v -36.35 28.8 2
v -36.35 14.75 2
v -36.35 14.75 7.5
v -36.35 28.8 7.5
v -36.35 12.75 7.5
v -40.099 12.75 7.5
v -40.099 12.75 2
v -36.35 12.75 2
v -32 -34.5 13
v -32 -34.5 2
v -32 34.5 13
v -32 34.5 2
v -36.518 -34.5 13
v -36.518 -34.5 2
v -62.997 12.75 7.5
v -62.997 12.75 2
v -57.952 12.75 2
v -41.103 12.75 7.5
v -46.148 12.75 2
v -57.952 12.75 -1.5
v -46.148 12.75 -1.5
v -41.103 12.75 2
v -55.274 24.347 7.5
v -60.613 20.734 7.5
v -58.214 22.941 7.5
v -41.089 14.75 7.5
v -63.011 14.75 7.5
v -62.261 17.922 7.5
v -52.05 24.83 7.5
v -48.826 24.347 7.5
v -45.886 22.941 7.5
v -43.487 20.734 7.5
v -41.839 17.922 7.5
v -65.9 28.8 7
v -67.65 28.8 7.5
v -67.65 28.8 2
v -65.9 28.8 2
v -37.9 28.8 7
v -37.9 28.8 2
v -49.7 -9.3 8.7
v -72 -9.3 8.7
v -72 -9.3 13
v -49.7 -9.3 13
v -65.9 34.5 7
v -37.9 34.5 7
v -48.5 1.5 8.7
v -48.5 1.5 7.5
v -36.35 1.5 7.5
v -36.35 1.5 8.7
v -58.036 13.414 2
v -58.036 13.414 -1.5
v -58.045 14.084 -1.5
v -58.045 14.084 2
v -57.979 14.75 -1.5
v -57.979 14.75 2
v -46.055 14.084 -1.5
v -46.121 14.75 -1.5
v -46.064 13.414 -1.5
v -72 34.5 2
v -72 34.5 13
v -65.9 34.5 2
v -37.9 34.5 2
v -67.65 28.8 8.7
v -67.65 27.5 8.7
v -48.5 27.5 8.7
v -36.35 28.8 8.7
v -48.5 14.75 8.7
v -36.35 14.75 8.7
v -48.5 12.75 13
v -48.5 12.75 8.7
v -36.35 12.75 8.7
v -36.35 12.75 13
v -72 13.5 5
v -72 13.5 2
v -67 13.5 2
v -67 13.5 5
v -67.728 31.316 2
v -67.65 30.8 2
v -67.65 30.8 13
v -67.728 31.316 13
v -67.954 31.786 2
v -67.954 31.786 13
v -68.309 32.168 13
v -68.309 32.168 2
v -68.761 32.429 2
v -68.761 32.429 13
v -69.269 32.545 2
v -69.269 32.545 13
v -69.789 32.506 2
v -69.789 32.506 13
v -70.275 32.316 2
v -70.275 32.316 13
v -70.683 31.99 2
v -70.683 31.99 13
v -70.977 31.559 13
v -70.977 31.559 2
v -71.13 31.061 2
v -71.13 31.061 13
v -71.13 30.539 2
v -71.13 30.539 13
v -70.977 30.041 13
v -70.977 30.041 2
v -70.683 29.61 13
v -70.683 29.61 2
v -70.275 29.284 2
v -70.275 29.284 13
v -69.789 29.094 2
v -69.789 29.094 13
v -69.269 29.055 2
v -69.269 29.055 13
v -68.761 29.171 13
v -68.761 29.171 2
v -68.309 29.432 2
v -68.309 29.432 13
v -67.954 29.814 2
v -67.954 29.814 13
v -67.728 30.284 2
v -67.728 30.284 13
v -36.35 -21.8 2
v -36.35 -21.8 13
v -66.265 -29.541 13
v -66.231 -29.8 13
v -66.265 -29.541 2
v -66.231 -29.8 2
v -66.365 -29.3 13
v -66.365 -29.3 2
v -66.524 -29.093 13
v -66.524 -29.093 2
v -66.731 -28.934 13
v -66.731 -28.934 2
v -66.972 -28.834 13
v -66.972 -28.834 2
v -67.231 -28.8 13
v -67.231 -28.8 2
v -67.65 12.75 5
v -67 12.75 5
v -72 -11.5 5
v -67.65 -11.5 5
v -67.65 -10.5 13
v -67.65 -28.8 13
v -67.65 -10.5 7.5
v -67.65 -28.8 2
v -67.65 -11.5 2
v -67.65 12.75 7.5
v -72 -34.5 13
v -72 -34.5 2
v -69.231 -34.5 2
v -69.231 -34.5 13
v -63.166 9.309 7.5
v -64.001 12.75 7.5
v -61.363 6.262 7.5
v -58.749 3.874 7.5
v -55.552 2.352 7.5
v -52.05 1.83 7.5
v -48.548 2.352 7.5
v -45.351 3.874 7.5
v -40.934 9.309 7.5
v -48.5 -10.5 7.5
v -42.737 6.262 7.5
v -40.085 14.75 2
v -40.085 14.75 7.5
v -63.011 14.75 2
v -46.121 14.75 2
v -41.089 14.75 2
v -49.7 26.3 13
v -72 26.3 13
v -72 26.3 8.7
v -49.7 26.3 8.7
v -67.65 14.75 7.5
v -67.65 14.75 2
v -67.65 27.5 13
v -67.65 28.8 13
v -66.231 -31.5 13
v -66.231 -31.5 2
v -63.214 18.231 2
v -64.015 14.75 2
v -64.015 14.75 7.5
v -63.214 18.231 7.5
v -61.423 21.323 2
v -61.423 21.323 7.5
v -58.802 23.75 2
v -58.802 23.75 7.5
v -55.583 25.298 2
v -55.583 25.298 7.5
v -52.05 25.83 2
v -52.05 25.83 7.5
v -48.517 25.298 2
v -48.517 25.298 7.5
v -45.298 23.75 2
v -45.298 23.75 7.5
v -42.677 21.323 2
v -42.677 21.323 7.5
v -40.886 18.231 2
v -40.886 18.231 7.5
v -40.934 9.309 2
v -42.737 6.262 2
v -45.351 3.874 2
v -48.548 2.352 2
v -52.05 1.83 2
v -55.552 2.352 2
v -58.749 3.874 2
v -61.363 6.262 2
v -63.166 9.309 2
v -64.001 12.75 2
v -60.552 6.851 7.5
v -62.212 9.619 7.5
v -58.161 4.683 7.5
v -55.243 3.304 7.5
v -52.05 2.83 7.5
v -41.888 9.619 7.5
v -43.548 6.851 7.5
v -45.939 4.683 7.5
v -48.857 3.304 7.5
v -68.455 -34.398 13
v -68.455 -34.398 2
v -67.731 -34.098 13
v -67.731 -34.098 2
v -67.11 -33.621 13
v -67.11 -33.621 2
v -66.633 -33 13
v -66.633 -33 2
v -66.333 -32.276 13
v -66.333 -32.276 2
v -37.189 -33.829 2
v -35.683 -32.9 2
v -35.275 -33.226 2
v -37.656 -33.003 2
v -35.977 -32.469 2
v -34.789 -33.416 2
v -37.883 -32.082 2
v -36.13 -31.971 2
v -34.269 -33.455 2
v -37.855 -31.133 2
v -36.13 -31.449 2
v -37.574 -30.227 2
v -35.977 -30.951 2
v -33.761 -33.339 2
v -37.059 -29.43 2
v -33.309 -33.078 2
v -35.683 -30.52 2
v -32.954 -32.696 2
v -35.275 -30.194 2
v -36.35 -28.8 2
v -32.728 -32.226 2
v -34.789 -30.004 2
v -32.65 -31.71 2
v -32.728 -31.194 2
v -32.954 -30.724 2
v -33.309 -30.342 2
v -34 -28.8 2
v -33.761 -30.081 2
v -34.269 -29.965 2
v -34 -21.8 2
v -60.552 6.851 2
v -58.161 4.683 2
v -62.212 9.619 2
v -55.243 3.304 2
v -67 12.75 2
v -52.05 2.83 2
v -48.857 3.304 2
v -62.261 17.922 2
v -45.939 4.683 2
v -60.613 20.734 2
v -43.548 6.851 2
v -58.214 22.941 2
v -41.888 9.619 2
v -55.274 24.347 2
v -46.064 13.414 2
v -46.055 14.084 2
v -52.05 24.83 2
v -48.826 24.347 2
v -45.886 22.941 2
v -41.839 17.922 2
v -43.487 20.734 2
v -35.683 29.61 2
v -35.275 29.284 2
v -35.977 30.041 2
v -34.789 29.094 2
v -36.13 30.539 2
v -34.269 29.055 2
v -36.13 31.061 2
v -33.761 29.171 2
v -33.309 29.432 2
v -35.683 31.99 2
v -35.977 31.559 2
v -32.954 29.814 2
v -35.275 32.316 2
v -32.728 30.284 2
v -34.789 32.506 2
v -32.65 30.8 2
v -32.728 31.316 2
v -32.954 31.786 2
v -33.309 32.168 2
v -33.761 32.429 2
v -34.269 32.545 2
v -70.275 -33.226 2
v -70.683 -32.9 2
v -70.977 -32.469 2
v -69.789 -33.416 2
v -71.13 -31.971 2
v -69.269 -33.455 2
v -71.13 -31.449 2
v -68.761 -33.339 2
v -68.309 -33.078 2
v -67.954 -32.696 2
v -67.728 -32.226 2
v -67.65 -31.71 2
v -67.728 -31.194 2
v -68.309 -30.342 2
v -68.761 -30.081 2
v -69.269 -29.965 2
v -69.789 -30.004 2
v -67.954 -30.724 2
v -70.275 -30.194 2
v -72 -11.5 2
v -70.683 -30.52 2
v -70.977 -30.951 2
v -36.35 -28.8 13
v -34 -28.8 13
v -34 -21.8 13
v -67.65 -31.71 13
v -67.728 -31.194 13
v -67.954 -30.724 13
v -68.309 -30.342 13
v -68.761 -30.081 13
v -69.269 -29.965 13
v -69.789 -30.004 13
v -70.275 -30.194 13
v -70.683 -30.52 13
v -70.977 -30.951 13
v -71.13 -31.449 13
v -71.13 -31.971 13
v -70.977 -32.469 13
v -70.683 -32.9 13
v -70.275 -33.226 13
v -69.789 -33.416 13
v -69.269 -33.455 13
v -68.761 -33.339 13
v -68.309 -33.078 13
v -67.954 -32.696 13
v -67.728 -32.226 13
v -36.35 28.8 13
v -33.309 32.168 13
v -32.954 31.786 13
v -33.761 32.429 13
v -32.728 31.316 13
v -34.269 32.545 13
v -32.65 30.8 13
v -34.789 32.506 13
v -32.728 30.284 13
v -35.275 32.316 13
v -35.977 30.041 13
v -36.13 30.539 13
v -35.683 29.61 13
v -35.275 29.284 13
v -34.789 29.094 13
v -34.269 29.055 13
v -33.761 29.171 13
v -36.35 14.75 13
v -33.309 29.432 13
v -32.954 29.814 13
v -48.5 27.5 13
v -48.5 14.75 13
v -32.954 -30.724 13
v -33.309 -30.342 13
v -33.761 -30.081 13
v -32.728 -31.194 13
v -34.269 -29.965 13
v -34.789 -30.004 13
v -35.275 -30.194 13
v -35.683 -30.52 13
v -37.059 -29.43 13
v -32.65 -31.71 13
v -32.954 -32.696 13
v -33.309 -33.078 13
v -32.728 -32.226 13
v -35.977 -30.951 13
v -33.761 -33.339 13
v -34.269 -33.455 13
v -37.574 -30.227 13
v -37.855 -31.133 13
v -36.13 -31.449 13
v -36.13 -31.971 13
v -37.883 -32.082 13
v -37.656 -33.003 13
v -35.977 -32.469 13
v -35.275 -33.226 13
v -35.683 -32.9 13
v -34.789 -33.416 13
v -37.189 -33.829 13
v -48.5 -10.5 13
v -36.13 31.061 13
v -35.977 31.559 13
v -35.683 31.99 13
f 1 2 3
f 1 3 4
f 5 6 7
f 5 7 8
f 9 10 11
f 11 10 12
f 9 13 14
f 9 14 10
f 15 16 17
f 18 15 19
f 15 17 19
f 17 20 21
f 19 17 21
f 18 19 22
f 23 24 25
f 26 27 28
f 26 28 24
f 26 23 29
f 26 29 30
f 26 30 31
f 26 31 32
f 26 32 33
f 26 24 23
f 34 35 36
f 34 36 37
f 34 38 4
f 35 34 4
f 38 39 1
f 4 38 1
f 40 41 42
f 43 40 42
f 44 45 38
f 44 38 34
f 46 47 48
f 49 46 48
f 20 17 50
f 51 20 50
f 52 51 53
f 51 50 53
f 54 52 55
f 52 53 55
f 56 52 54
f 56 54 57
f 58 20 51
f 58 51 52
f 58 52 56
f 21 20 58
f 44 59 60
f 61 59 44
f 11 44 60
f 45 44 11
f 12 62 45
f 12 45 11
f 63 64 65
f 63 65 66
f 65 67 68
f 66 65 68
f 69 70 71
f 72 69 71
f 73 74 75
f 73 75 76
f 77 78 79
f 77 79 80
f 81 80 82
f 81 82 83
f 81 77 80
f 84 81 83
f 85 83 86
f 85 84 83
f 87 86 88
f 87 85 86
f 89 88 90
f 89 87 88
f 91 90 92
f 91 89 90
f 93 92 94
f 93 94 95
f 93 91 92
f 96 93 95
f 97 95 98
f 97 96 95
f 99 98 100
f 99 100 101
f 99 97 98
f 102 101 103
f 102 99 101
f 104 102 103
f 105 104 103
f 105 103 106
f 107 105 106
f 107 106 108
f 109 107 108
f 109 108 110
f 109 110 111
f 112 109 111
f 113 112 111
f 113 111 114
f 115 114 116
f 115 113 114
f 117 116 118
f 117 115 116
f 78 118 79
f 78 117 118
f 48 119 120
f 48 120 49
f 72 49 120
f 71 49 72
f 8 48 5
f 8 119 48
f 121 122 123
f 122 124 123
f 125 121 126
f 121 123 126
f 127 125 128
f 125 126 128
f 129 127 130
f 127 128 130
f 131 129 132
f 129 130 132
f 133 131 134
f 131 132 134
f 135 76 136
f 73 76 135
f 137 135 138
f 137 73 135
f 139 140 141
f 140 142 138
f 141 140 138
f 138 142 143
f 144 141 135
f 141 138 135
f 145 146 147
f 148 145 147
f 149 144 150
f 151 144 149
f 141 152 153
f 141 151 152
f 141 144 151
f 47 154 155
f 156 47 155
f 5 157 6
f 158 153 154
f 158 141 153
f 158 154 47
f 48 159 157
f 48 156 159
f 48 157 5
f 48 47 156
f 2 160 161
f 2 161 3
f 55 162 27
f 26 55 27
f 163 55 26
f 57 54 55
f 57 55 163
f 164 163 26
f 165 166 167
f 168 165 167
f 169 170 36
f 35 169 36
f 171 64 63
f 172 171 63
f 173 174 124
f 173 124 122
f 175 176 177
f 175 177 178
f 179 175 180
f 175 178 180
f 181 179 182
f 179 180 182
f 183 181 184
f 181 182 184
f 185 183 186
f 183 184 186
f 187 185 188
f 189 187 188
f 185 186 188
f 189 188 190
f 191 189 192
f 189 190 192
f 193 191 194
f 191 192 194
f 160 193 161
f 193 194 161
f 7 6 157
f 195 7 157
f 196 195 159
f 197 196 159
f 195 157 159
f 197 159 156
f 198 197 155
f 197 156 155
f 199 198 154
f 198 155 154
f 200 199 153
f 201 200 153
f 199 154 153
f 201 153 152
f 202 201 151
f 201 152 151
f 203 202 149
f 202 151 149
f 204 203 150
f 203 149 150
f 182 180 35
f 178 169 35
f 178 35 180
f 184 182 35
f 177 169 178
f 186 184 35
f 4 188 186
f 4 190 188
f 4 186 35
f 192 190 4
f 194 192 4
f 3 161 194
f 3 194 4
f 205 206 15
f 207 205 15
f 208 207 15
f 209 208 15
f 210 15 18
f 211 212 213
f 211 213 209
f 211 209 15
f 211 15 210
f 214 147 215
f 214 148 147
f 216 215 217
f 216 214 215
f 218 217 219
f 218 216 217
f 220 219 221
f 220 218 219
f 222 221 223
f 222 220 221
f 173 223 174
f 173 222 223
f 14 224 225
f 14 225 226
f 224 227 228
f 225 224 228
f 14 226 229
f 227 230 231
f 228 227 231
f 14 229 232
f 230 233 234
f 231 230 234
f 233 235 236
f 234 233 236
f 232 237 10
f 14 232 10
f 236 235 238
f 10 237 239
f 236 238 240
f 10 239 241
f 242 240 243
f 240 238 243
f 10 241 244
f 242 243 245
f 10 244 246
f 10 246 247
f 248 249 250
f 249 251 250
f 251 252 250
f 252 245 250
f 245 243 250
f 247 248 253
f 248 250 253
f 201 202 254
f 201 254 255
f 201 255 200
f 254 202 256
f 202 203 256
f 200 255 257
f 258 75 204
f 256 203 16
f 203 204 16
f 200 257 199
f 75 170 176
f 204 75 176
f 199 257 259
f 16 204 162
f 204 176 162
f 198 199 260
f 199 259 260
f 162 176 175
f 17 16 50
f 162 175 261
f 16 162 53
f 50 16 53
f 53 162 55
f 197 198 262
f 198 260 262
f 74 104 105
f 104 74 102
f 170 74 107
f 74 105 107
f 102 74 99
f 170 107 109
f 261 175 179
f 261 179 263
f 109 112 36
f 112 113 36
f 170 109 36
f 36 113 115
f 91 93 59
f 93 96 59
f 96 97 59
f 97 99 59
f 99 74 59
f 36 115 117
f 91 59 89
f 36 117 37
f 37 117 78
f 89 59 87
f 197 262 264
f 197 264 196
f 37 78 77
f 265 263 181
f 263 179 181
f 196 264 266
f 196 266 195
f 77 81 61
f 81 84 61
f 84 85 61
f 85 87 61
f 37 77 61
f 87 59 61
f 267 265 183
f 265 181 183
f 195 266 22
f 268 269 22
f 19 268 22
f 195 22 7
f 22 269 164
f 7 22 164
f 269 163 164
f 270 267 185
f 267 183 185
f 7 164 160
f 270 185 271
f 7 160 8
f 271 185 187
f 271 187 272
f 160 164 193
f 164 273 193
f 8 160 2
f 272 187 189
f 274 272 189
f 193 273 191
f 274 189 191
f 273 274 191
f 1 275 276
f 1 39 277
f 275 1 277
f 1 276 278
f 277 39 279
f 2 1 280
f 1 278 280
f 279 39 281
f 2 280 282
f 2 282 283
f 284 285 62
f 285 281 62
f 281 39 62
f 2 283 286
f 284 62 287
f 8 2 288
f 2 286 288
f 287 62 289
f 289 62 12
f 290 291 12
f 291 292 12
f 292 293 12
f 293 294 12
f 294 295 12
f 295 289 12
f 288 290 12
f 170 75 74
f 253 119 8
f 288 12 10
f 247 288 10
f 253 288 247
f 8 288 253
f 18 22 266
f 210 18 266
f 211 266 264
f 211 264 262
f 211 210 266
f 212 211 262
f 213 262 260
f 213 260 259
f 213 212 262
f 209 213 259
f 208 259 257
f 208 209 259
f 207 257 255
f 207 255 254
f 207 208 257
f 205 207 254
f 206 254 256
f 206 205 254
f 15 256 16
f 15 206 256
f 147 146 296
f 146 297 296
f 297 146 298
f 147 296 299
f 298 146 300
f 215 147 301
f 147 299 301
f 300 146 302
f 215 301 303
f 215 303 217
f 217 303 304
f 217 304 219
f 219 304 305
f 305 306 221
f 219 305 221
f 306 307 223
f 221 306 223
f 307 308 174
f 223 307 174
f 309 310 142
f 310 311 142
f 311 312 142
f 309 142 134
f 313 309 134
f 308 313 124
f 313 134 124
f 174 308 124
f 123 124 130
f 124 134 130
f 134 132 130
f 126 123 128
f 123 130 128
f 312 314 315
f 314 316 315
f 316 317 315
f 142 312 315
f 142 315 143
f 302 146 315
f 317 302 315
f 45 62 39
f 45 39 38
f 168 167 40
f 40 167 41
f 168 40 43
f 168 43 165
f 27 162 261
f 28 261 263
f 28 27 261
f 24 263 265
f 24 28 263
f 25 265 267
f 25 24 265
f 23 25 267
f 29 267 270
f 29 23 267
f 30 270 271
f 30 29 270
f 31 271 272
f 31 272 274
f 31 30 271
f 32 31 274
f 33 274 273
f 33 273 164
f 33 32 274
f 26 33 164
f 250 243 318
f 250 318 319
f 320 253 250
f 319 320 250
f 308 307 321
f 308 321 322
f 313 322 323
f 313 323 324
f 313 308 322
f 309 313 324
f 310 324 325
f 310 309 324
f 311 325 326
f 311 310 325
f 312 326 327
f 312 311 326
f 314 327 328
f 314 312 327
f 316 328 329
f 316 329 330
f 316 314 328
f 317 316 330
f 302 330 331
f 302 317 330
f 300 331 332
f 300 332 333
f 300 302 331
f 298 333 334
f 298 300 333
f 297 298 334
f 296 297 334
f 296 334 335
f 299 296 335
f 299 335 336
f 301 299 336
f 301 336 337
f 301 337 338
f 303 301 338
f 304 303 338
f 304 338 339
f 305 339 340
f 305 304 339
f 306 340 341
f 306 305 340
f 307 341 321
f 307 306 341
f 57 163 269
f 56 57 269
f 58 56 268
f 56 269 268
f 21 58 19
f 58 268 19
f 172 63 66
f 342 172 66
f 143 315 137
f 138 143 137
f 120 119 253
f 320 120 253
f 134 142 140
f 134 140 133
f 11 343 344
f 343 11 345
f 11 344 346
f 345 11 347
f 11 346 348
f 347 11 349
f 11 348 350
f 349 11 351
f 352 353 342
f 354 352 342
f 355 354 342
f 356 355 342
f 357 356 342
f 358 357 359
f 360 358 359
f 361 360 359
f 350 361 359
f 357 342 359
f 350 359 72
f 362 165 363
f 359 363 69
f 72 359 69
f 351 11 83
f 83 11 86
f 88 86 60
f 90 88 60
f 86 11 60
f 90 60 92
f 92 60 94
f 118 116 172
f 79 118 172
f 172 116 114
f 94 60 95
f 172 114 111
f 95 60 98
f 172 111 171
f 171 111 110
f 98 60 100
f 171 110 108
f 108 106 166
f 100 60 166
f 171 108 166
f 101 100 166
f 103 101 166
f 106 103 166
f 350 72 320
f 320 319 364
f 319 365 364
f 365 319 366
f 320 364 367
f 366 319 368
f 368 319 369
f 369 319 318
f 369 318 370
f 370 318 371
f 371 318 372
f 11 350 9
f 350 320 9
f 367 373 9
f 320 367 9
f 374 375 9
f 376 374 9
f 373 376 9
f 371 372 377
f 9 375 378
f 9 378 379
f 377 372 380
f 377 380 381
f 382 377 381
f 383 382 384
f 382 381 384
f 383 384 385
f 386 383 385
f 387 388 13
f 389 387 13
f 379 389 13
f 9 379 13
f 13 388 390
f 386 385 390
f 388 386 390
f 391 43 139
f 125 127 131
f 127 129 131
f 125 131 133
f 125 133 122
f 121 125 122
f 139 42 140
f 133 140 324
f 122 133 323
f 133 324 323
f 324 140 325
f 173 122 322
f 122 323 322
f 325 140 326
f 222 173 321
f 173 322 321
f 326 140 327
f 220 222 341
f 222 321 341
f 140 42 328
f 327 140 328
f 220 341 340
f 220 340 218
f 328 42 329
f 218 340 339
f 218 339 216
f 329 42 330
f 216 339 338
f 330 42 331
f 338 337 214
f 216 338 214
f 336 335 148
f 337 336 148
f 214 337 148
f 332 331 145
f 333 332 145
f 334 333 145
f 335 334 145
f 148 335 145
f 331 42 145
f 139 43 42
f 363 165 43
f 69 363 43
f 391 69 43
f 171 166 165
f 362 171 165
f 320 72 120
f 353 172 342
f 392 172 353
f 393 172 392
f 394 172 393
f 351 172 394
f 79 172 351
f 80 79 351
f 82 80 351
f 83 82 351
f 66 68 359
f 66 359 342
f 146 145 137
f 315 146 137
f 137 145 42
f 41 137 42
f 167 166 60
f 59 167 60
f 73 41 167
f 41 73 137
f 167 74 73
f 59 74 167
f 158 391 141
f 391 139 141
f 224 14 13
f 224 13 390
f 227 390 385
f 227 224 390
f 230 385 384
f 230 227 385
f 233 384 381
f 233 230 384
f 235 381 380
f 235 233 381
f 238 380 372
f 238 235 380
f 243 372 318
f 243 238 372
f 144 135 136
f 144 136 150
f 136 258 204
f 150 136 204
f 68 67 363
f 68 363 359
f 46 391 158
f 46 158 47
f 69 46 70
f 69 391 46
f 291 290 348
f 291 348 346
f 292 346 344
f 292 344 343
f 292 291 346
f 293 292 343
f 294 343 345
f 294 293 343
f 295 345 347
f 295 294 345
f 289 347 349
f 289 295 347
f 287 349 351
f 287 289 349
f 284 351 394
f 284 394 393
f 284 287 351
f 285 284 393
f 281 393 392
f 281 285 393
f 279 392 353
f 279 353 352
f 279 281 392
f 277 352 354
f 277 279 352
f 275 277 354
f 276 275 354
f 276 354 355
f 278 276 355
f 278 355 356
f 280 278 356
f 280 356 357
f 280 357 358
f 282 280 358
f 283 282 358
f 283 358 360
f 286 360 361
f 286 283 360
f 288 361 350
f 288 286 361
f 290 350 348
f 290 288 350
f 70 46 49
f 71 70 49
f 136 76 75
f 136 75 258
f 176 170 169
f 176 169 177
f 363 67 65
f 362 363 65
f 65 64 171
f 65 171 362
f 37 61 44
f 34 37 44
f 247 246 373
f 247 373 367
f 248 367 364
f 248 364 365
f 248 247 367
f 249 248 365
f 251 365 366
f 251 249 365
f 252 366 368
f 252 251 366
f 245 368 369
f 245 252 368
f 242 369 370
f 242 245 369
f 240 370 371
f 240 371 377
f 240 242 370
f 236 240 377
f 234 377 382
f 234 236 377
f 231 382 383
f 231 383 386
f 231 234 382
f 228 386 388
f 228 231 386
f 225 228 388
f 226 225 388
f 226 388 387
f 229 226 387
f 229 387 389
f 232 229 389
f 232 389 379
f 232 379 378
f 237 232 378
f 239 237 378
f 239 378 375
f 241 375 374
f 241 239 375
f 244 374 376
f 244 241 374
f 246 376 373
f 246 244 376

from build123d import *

# Parameters (mm, degrees)
SKETCH009_W     = 40
SKETCH009_H     = 69
SKETCH009_R     = 1.75
SKETCH009_W_2   = 31.3
SKETCH009_H_2   = 57.6
PAD004_DEPTH    = 11
SKETCH010_W     = 28
SKETCH010_H     = 23
POCKET005_DEPTH = 8
SKETCH011_W     = 28
SKETCH011_H     = 5
POCKET006_DEPTH = 8
SKETCH012_W     = 25
SKETCH012_H     = 3
POCKET007_DEPTH = 7
SKETCH013_W     = 38
SKETCH013_H     = 5.5
POCKET008_DEPTH = 5
SKETCH014_W     = 31.3
SKETCH014_H     = 2
PAD005_DEPTH    = 11
SKETCH015_W     = 12.5
SKETCH015_H     = 3
POCKET009_DEPTH = 5
SKETCH016_W     = 38
SKETCH016_H     = 5.5
POCKET010_DEPTH = 23.5
PAD006_DEPTH    = 23.5
SKETCH018_W     = 1.2
SKETCH018_H     = 38
PAD007_DEPTH    = 4.3
SKETCH019_W     = 12.15
SKETCH019_H     = 26
PAD008_DEPTH    = 1.2
SKETCH032_W     = 2.35
SKETCH032_H     = 7
POCKET014_DEPTH = 13
SKETCH033_W     = 31.3
SKETCH033_H     = 5
PAD018_DEPTH    = 1.2
SKETCH034_R     = 12
SKETCH034_R_2   = 11
PAD019_DEPTH    = 5.5
PAD020_DEPTH    = 3.5
FILLET_R        = 3
FILLET001_R     = 1


with BuildPart() as part:
    # Sketch009 → Pad004 (new body)
    with BuildSketch(Plane.XY):
        with Locations((-0.1, -1)):
            Rectangle(SKETCH009_W, SKETCH009_H)
        with Locations((-17.5, -32.71)):
            Circle(SKETCH009_R, mode=Mode.SUBTRACT)
        with Locations((17.5, -32.71)):
            Circle(SKETCH009_R, mode=Mode.SUBTRACT)
        with Locations((-17.5, 29.8)):
            Circle(SKETCH009_R, mode=Mode.SUBTRACT)
        with Locations((17.5, 29.8)):
            Circle(SKETCH009_R, mode=Mode.SUBTRACT)
        with Locations((-0.1, -1)):
            Rectangle(SKETCH009_W_2, SKETCH009_H_2, mode=Mode.SUBTRACT)
    extrude(amount=PAD004_DEPTH)

    # Sketch010 (on Face3 of Pad004) → Pocket005 (cut)
    with BuildSketch(Plane.XZ.offset(35.5)):
        with Locations((-0.331047, 5.882488)):
            Rectangle(SKETCH010_W, SKETCH010_H)
    extrude(amount=-POCKET005_DEPTH, mode=Mode.SUBTRACT)

    # Sketch011 (on Face1 of Pocket005) → Pocket006 (cut)
    with BuildSketch(Plane(origin=(0, 33.5, 0), x_dir=(-1, 0, 0), z_dir=(0, 1, 0))):
        with Locations((0, 2.5)):
            Rectangle(SKETCH011_W, SKETCH011_H)
    extrude(amount=-POCKET006_DEPTH, mode=Mode.SUBTRACT)

    # Sketch012 (on Face9 of Pocket006) → Pocket007 (cut)
    with BuildSketch(Plane(origin=(-20.1, 0, 0), x_dir=(0, -1, 0), z_dir=(-1, 0, 0))):
        with Locations((0, 1.5)):
            Rectangle(SKETCH012_W, SKETCH012_H)
    extrude(amount=-POCKET007_DEPTH, mode=Mode.SUBTRACT)

    # Sketch013 (on Face9 of Pocket007) → Pocket008 (cut)
    with BuildSketch(Plane(origin=(-20.1, 0, 0), x_dir=(0, -1, 0), z_dir=(-1, 0, 0))):
        with Locations((-7.5, 8.25)):
            Rectangle(SKETCH013_W, SKETCH013_H)
    extrude(amount=-POCKET008_DEPTH, mode=Mode.SUBTRACT)

    # Sketch014 → Pad005 (join)
    with BuildSketch(Plane.XY):
        with Locations((-0.1, 12.75)):
            Rectangle(SKETCH014_W, SKETCH014_H)
    extrude(amount=PAD005_DEPTH)

    # Sketch015 (on Face9 of Pad005) → Pocket009 (cut)
    with BuildSketch(Plane(origin=(-20.1, 0, 0), x_dir=(0, -1, 0), z_dir=(-1, 0, 0))):
        with Locations((-6.25, 1.5)):
            Rectangle(SKETCH015_W, SKETCH015_H)
    extrude(amount=-POCKET009_DEPTH, mode=Mode.SUBTRACT)

    # Sketch016 (on Face9 of Pocket009) → Pocket010 (cut)
    with BuildSketch(Plane(origin=(-20.1, 0, 0), x_dir=(0, -1, 0), z_dir=(-1, 0, 0))):
        with Locations((-7.5, 8.25)):
            Rectangle(SKETCH016_W, SKETCH016_H)
    extrude(amount=-POCKET010_DEPTH, mode=Mode.SUBTRACT)

    # Sketch017 (on Face9 of Pocket010) → Pad006 (join)
    with BuildSketch(Plane(origin=(-20.1, 0, 0), x_dir=(0, -1, 0), z_dir=(-1, 0, 0))):
        Polygon((11.5, 11), (11.5, 5.5), (-26.5, 5.5), (-26.5, 11), (-25.3, 11), (-25.3, 6.7), (10.3, 6.7), (10.3, 11), align=None)
    extrude(amount=-PAD006_DEPTH)

    # Sketch018 (on Face45 of Pad006) → Pad007 (join)
    with BuildSketch(Plane.XY.offset(6.7)):
        with Locations((2.8, 7.5)):
            Rectangle(SKETCH018_W, SKETCH018_H)
    extrude(amount=PAD007_DEPTH)

    # Sketch019 (on Face36 of Pad007) → Pad008 (join)
    with BuildSketch(Plane(origin=(0, 0, 5.5), x_dir=(1, 0, 0), z_dir=(0, 0, -1))):
        with Locations((9.475, -13.5)):
            Rectangle(SKETCH019_W, SKETCH019_H)
    extrude(amount=-PAD008_DEPTH)

    # Sketch032 (on Face6 of Pad008) → Pocket014 (cut)
    with BuildSketch(Plane(origin=(0, 0, 0), x_dir=(1, 0, 0), z_dir=(0, 0, -1))):
        with Locations((16.725, 26.3)):
            Rectangle(SKETCH032_W, SKETCH032_H)
        with BuildLine():
            ThreePointArc((16.553467, 36.082636), (14.040903, 33.26249), (15.55, 29.8))
            Line((15.55, 29.8), (10.188963, 29.8))
            Line((10.188963, 29.8), (10.188963, 36.082636))
            Line((10.188963, 36.082636), (16.553467, 36.082636))
        make_face()
    extrude(amount=-POCKET014_DEPTH, mode=Mode.SUBTRACT)

    # Sketch033 (on Face43 of Pocket014) → Pad018 (join)
    with BuildSketch(Plane(origin=(0, 0, 5.5), x_dir=(1, 0, 0), z_dir=(0, 0, -1))):
        with Locations((-0.1, -25.3)):
            Rectangle(SKETCH033_W, SKETCH033_H)
    extrude(amount=-PAD018_DEPTH)

    # Sketch034 (on Face41 of Pad018) → Pad019 (join)
    with BuildSketch(Plane(origin=(0, 0, 5.5), x_dir=(1, 0, 0), z_dir=(0, 0, -1))):
        with Locations((-0.15, -12.83)):
            Circle(SKETCH034_R)
        with Locations((-0.15, -12.83)):
            Circle(SKETCH034_R_2, mode=Mode.SUBTRACT)
    extrude(amount=PAD019_DEPTH)

    # Sketch035 (on Face75 of Pad019) → Pad020 (join)
    with BuildSketch(Plane(origin=(0, 0, 0), x_dir=(1, 0, 0), z_dir=(0, 0, -1))):
        with BuildLine():
            ThreePointArc((-6.052, -11.75), (-6.149451, -12.748865), (-6.079047, -13.75))
            Line((-6.079047, -13.75), (5.779047, -13.75))
            ThreePointArc((5.779047, -13.75), (5.849451, -12.748865), (5.752, -11.75))
            Line((-6.052, -11.75), (5.752, -11.75))
        make_face()
    extrude(amount=PAD020_DEPTH)

    # Fillet
    fillet_edges = [part.edges().sort_by_distance(p)[0] for p in [
        (-14.331047, -35.5, 5.5),
    ]]
    fillet(fillet_edges, radius=FILLET_R)

    # Fillet001
    fillet001_edges = [part.edges().sort_by_distance(p)[0] for p in [
        (-14.331047, -29.8, 5.5),
    ]]
    fillet(fillet001_edges, radius=FILLET001_R)


with BuildPart() as part_1:
    # Body001 placement: moved
    add(part.part.moved(Location((-51.9, 1, 2))))


solid = part_1.part
